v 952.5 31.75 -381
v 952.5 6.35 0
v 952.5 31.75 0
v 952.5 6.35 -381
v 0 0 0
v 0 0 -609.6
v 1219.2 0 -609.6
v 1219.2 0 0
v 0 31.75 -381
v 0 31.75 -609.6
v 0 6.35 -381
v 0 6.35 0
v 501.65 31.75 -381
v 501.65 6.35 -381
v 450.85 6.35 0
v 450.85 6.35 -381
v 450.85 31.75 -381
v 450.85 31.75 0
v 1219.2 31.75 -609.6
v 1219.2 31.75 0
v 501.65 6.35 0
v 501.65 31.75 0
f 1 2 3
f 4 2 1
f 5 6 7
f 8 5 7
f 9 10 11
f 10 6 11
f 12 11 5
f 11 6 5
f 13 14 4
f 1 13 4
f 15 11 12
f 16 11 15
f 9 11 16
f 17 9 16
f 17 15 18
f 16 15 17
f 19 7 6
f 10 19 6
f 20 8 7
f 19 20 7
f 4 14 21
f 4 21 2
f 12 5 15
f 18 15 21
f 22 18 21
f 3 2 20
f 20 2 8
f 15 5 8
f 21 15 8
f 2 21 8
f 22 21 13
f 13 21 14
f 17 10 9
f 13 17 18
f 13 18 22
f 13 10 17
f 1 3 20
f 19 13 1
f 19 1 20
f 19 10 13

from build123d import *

# Parameters (mm, degrees)
SKETCH1_W           = 1219.2
SKETCH1_H           = 609.6
BOSS_EXTRUDE1_DEPTH = 6.35
SKETCH7_W           = 266.7
SKETCH7_H           = 381
SKETCH7_W_2         = 50.8
BOSS_EXTRUDE2_DEPTH = 25.4


with BuildPart() as part:
    # Sketch1 → Boss-Extrude1 (new body)
    with BuildSketch(Plane(origin=(0, 0, 0), x_dir=(1, 0, 0), z_dir=(0, 1, 0))):
        with Locations((609.6, 304.8)):
            Rectangle(SKETCH1_W, SKETCH1_H)
    extrude(amount=BOSS_EXTRUDE1_DEPTH)

    # Sketch7 → Boss-Extrude2 (add)
    with BuildSketch(Plane(origin=(0, 6.35, 0), x_dir=(1, 0, 0), z_dir=(0, 1, 0))):
        Polygon((1219.2, 609.6), (0, 609.6), (0, 381), (450.85, 381), (501.65, 381), (952.5, 381), (1219.2, 381), align=None)
        with Locations((1085.85, 190.5)):
            Rectangle(SKETCH7_W, SKETCH7_H)
        with Locations((476.25, 190.5)):
            Rectangle(SKETCH7_W_2, SKETCH7_H)
    extrude(amount=BOSS_EXTRUDE2_DEPTH)


solid = part.part
